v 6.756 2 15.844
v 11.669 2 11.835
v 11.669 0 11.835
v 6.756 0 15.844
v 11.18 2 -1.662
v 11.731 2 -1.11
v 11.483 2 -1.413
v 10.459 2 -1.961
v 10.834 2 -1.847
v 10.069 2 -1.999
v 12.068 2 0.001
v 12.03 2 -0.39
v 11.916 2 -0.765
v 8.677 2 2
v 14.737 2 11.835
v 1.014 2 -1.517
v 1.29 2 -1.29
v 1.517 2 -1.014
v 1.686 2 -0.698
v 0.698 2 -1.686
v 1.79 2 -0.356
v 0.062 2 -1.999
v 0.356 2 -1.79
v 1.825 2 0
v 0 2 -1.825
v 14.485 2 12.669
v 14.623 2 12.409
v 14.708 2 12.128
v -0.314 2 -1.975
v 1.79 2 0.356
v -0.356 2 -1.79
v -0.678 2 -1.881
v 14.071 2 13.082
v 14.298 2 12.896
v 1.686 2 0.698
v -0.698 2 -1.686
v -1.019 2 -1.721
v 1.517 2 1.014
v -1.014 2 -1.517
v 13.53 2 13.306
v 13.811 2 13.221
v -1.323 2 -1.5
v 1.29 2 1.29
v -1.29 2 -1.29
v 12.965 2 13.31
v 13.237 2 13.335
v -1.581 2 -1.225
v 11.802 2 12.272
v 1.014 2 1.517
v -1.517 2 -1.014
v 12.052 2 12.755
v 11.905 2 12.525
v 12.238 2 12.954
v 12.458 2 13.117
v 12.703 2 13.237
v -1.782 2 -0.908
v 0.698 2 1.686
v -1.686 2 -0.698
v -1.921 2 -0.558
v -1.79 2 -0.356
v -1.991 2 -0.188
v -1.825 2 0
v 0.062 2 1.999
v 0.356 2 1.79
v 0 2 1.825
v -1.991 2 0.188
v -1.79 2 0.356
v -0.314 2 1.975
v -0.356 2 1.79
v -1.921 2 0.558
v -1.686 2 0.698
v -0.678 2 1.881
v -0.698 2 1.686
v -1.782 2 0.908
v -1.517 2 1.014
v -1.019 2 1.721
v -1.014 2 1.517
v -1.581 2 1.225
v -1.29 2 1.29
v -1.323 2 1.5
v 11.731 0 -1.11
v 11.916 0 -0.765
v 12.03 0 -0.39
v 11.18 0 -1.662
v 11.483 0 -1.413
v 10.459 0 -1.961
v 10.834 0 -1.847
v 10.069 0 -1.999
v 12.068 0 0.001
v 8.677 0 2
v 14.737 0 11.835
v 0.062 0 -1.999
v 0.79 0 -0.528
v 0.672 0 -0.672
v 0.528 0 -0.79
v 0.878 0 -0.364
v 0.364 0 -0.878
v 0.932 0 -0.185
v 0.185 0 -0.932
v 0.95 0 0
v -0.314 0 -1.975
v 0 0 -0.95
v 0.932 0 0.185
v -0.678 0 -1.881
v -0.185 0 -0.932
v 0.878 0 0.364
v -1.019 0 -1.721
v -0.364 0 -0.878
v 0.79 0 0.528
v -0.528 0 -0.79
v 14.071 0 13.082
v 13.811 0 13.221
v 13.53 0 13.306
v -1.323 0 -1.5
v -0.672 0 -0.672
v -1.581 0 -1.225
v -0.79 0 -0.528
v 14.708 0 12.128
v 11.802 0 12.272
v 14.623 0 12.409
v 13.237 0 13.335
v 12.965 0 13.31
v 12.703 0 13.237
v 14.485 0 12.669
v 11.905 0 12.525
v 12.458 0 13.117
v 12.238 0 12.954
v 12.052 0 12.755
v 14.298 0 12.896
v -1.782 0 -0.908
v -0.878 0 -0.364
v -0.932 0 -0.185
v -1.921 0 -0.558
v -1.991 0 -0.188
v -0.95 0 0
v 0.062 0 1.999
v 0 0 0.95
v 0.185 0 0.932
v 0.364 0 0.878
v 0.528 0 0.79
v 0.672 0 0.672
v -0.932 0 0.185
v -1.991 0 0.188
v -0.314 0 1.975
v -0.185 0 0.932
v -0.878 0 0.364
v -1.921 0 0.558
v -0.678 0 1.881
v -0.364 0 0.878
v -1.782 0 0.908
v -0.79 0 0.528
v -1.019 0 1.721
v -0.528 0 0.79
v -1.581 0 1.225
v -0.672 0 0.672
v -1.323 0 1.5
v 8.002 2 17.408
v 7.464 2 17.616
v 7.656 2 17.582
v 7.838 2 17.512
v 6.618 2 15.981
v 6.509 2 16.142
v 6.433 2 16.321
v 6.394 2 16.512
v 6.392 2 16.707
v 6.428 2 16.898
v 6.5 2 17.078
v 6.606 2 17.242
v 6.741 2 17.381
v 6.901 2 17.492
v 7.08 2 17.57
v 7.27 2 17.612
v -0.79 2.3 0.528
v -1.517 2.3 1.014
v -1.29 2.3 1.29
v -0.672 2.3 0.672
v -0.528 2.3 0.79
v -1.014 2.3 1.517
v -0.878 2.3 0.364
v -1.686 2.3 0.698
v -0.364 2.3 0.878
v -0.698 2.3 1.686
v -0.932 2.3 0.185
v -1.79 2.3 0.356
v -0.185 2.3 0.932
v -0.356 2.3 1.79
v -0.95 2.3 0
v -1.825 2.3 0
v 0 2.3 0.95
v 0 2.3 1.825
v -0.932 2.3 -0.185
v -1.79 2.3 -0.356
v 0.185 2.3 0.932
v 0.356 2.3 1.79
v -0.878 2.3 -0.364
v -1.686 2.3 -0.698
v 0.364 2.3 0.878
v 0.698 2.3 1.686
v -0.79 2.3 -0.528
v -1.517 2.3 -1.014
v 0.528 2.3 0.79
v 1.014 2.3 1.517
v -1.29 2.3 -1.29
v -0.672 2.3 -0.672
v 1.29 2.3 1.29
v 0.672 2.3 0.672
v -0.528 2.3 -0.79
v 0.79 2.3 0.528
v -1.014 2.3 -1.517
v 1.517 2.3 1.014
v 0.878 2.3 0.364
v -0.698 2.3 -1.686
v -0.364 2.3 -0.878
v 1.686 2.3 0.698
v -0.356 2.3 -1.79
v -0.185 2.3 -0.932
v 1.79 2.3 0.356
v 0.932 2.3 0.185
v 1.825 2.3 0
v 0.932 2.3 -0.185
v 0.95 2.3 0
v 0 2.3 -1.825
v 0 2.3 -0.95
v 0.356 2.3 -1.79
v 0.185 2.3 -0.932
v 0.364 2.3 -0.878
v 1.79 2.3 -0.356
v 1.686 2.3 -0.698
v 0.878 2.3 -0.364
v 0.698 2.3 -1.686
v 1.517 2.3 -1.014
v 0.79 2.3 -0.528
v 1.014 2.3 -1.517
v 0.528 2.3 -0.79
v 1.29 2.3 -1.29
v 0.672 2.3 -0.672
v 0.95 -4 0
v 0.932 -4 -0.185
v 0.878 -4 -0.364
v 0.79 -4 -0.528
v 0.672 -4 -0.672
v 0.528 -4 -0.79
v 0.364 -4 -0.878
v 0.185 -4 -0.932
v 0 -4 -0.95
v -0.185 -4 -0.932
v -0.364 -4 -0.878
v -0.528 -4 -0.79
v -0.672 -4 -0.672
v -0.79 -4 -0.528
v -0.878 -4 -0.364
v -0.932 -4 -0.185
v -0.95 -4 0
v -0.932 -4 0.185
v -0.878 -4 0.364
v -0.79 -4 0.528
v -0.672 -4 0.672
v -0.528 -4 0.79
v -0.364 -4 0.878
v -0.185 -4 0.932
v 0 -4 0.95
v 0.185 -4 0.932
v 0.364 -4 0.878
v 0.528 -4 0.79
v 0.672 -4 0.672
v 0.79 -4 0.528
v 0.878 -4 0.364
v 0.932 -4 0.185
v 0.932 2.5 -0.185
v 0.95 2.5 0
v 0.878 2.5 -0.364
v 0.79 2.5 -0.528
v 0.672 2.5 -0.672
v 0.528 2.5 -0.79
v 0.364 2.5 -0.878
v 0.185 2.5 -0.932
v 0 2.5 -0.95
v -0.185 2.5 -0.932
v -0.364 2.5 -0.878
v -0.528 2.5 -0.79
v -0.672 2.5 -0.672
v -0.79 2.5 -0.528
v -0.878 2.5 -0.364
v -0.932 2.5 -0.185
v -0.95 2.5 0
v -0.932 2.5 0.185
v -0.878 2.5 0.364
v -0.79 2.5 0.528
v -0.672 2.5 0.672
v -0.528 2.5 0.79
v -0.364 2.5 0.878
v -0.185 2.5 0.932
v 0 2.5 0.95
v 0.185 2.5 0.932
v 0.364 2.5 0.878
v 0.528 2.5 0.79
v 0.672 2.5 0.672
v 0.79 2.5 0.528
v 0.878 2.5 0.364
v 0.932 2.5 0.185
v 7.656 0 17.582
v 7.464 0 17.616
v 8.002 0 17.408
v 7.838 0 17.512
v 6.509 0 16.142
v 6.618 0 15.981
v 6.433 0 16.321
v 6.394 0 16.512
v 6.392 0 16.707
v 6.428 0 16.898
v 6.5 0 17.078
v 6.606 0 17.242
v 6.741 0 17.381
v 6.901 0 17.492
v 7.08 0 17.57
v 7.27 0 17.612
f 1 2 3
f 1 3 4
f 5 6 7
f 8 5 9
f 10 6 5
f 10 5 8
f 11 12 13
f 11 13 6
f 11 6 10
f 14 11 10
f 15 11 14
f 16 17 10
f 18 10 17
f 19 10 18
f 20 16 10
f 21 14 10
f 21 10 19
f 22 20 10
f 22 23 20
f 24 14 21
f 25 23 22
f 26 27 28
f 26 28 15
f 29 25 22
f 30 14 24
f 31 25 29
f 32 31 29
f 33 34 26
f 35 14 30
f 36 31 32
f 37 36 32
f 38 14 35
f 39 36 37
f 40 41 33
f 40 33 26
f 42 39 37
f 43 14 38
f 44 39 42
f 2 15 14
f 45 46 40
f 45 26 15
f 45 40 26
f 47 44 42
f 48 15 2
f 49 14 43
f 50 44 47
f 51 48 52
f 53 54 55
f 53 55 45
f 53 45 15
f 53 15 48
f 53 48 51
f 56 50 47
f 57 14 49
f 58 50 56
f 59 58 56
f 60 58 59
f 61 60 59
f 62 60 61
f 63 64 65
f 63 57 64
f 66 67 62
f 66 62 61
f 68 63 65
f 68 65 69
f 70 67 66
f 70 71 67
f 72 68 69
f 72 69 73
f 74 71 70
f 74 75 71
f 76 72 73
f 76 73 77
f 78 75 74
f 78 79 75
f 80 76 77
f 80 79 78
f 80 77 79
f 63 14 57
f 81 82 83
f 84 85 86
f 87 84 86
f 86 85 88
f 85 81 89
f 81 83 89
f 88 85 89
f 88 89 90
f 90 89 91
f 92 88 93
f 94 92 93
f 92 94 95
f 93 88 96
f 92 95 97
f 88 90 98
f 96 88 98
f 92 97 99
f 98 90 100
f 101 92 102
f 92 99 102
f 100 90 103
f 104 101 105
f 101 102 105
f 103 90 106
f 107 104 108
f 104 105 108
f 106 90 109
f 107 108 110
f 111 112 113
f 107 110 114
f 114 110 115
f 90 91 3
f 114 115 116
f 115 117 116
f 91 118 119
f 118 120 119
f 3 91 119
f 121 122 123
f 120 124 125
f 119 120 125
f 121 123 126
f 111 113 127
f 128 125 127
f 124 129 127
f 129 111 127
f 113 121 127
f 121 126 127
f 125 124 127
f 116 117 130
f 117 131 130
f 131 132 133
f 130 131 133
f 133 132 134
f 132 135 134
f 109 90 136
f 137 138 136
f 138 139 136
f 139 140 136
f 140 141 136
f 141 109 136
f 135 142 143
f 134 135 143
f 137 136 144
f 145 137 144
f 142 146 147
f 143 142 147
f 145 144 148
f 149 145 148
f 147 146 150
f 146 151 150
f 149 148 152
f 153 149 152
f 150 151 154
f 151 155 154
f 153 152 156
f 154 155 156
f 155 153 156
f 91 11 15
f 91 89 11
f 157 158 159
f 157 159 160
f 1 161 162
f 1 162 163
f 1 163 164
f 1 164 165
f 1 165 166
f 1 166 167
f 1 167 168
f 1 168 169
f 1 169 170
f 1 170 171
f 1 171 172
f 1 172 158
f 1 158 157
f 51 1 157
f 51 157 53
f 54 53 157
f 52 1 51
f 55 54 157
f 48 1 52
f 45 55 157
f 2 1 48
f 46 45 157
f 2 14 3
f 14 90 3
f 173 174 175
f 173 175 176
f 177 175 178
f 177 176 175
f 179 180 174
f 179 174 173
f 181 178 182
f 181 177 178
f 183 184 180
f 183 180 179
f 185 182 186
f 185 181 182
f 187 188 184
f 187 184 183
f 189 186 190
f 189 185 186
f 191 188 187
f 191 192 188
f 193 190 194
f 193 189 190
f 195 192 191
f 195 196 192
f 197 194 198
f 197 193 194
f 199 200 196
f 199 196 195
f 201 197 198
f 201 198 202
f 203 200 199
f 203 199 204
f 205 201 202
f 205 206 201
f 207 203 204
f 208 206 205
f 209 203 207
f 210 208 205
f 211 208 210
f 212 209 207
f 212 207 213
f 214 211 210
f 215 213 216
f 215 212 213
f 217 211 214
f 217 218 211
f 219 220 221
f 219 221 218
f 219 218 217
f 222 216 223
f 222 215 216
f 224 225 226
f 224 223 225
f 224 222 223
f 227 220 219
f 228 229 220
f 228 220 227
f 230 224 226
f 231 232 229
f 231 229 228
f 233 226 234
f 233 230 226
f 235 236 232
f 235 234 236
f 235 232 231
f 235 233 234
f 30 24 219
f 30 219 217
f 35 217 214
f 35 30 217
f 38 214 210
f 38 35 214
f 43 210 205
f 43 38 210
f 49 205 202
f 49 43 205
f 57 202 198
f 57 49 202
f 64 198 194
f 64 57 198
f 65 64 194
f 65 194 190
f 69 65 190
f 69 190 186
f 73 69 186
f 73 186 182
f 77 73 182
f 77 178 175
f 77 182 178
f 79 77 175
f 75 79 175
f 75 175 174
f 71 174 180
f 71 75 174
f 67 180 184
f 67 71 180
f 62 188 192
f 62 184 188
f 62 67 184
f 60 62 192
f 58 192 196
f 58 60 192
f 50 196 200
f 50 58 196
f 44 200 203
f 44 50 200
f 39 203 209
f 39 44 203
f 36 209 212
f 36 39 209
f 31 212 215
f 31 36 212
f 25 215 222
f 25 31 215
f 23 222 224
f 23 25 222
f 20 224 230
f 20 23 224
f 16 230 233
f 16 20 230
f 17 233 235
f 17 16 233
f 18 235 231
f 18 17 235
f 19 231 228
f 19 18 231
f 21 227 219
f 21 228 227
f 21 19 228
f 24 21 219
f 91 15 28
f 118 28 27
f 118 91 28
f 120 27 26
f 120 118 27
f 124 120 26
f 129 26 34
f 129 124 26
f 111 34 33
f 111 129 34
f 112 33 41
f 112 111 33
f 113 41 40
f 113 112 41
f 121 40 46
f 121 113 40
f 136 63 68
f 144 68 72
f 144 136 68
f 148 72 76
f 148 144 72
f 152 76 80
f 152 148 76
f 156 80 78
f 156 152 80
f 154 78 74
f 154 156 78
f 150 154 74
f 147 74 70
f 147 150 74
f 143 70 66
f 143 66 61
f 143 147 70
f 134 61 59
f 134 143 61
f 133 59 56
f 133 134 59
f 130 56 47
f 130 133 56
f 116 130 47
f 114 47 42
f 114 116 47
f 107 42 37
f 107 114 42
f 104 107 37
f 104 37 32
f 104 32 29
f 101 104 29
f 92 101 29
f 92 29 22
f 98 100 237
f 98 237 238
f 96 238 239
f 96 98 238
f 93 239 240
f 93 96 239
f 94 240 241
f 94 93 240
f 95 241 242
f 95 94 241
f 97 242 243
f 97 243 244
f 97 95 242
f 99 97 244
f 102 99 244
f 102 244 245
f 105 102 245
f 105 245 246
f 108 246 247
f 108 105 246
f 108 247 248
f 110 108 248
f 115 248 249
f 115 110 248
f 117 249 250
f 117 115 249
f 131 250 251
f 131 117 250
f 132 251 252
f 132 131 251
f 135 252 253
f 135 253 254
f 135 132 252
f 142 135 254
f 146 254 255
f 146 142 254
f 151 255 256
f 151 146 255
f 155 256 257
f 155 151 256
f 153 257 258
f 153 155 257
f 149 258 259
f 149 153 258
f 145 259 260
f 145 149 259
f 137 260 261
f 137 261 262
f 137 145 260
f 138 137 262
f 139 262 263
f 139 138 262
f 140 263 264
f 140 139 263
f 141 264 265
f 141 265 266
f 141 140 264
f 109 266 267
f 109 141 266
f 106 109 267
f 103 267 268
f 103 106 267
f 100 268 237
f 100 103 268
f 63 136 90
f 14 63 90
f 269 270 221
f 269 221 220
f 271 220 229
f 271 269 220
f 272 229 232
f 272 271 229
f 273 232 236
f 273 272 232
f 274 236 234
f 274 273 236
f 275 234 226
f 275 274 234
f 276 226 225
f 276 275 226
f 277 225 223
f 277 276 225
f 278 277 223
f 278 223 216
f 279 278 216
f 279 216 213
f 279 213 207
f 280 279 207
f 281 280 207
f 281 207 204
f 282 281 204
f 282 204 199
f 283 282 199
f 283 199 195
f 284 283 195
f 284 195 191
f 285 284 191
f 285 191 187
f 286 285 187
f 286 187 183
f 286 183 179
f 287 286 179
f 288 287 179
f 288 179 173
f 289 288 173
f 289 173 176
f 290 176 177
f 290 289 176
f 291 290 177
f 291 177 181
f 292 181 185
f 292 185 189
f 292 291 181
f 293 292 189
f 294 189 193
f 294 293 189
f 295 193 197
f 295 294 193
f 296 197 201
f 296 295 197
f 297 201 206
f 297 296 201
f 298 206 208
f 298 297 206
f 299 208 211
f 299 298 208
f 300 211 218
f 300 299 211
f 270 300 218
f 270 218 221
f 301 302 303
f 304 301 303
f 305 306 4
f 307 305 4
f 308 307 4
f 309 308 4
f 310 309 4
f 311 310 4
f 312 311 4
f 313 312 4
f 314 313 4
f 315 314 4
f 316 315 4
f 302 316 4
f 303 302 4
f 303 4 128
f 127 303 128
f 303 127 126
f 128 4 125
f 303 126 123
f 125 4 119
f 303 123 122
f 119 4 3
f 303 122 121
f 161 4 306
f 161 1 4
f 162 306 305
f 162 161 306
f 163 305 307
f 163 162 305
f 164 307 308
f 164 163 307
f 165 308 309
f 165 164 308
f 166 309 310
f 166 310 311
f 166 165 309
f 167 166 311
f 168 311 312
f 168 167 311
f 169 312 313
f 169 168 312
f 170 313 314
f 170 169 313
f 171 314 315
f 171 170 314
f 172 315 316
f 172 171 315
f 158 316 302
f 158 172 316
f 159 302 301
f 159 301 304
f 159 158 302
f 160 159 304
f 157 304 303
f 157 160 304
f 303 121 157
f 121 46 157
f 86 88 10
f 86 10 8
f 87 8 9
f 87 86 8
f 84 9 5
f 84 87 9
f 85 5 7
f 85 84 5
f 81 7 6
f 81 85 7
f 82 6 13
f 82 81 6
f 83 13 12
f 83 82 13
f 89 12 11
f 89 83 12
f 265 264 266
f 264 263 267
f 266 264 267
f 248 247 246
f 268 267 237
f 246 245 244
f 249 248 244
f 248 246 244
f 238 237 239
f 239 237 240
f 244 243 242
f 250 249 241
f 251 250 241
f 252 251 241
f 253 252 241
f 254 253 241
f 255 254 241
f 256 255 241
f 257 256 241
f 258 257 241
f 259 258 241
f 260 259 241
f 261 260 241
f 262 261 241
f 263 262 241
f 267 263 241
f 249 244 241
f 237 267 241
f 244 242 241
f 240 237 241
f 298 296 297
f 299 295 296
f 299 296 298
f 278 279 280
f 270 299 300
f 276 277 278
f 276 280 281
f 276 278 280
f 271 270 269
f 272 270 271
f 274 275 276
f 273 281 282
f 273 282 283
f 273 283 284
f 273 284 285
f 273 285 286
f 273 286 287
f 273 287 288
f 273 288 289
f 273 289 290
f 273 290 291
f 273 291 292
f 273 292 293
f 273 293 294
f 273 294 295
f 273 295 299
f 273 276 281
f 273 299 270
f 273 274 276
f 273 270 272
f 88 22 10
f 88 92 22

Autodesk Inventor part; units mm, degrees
ref_plane "YZ Plane" through (0, 0, 0) normal (1, 0, 0) x (0, 1, 0)
ref_plane "XZ Plane" through (0, 0, 0) normal (0, 1, 0) x (-1, 0, 0)
ref_plane "XY Plane" through (0, 0, 0) normal (0, 0, 1) x (1, 0, 0)
sketch "Sketch1" plane through (0, 0, 0) normal (0, 1, 0) x (-1, 0, 0)
  circle A0 centre (0, 0) radius 2
  circle A1 centre (0, 0) radius 0.95
  circle A2 centre (-10.0688, 0.0006) radius 1.9997
  line L0 (-0.0618, -1.999) -> (-10.0688, -1.999)
  line L1 (-0.0618, 1.999) -> (-10.0686, 2.0003)
  circle A3 centre (-13.2373, 11.8352) radius 1.5
  line L2 (-8.0691, 0.0006) -> (-11.8022, 12.2717)
  line L3 (-12.0685, 0.0006) -> (-14.7373, 11.8352)
  circle A4 centre (-8.6896, 15.1639) radius 1
  line L4 (-13.2373, 13.3352) -> (-9.2441, 15.9961)
  line L5 (-13.2373, 10.3352) -> (-8.0733, 14.3764)
  dimension "d0" = 4
  dimension "d1" = 1.9
  dimension "d2" = 3
  dimension "d13" = 2
extrude "Extrusion1" add sketch "Sketch1" along normal blind 2 contours A0 | A0 L0 A2 L2 L1 | L2 A2 L1 | L1 A2 L3 A3 L5 L2 | A2 L2 | A2 L2 | L5 A3 L2 | A3 L5 L3 | A3 L5
sketch "Sketch2" plane through (0, 2, 0) normal (0, 1, 0) x (1, 0, 0)
  circle A0 centre (0, 0) radius 0.95
extrude "Extrusion2" add sketch "Sketch2" against normal blind 6 and the other way blind 0.5
thread "Thread1" size "M2x0.4" class "6g" standard "ANSI Metric M Profile" full length
sketch "Sketch3" plane through (0, 2, 0) normal (0, 1, 0) x (1, 0, 0)
  circle A0 centre (0, 0) radius 1.8246
extrude "Extrusion3" add sketch "Sketch3" along normal blind 0.3
sketch "Sketch4" plane through (0, 2, 0) normal (0, 1, 0) x (1, 0, 0)
  circle A0 centre (7.388, -16.6186) radius 1
  arc A1 (11.8022, -12.2717) -> (14.7373, -11.8352) centre (13.2373, -11.8352) ccw projected
  line L0 (13.2373, -13.3352) -> (8.002, -17.4079)
  line L1 (8.6774, -2.0002) -> (11.8022, -12.2717) projected
  line L2 (11.6694, -11.8352) -> (6.7559, -15.8438)
  point P0 (0, 0)
  dimension "d14" = 2
extrude "Extrusion4" add sketch "Sketch4" against normal blind 2
properties part number "servo_hook"
